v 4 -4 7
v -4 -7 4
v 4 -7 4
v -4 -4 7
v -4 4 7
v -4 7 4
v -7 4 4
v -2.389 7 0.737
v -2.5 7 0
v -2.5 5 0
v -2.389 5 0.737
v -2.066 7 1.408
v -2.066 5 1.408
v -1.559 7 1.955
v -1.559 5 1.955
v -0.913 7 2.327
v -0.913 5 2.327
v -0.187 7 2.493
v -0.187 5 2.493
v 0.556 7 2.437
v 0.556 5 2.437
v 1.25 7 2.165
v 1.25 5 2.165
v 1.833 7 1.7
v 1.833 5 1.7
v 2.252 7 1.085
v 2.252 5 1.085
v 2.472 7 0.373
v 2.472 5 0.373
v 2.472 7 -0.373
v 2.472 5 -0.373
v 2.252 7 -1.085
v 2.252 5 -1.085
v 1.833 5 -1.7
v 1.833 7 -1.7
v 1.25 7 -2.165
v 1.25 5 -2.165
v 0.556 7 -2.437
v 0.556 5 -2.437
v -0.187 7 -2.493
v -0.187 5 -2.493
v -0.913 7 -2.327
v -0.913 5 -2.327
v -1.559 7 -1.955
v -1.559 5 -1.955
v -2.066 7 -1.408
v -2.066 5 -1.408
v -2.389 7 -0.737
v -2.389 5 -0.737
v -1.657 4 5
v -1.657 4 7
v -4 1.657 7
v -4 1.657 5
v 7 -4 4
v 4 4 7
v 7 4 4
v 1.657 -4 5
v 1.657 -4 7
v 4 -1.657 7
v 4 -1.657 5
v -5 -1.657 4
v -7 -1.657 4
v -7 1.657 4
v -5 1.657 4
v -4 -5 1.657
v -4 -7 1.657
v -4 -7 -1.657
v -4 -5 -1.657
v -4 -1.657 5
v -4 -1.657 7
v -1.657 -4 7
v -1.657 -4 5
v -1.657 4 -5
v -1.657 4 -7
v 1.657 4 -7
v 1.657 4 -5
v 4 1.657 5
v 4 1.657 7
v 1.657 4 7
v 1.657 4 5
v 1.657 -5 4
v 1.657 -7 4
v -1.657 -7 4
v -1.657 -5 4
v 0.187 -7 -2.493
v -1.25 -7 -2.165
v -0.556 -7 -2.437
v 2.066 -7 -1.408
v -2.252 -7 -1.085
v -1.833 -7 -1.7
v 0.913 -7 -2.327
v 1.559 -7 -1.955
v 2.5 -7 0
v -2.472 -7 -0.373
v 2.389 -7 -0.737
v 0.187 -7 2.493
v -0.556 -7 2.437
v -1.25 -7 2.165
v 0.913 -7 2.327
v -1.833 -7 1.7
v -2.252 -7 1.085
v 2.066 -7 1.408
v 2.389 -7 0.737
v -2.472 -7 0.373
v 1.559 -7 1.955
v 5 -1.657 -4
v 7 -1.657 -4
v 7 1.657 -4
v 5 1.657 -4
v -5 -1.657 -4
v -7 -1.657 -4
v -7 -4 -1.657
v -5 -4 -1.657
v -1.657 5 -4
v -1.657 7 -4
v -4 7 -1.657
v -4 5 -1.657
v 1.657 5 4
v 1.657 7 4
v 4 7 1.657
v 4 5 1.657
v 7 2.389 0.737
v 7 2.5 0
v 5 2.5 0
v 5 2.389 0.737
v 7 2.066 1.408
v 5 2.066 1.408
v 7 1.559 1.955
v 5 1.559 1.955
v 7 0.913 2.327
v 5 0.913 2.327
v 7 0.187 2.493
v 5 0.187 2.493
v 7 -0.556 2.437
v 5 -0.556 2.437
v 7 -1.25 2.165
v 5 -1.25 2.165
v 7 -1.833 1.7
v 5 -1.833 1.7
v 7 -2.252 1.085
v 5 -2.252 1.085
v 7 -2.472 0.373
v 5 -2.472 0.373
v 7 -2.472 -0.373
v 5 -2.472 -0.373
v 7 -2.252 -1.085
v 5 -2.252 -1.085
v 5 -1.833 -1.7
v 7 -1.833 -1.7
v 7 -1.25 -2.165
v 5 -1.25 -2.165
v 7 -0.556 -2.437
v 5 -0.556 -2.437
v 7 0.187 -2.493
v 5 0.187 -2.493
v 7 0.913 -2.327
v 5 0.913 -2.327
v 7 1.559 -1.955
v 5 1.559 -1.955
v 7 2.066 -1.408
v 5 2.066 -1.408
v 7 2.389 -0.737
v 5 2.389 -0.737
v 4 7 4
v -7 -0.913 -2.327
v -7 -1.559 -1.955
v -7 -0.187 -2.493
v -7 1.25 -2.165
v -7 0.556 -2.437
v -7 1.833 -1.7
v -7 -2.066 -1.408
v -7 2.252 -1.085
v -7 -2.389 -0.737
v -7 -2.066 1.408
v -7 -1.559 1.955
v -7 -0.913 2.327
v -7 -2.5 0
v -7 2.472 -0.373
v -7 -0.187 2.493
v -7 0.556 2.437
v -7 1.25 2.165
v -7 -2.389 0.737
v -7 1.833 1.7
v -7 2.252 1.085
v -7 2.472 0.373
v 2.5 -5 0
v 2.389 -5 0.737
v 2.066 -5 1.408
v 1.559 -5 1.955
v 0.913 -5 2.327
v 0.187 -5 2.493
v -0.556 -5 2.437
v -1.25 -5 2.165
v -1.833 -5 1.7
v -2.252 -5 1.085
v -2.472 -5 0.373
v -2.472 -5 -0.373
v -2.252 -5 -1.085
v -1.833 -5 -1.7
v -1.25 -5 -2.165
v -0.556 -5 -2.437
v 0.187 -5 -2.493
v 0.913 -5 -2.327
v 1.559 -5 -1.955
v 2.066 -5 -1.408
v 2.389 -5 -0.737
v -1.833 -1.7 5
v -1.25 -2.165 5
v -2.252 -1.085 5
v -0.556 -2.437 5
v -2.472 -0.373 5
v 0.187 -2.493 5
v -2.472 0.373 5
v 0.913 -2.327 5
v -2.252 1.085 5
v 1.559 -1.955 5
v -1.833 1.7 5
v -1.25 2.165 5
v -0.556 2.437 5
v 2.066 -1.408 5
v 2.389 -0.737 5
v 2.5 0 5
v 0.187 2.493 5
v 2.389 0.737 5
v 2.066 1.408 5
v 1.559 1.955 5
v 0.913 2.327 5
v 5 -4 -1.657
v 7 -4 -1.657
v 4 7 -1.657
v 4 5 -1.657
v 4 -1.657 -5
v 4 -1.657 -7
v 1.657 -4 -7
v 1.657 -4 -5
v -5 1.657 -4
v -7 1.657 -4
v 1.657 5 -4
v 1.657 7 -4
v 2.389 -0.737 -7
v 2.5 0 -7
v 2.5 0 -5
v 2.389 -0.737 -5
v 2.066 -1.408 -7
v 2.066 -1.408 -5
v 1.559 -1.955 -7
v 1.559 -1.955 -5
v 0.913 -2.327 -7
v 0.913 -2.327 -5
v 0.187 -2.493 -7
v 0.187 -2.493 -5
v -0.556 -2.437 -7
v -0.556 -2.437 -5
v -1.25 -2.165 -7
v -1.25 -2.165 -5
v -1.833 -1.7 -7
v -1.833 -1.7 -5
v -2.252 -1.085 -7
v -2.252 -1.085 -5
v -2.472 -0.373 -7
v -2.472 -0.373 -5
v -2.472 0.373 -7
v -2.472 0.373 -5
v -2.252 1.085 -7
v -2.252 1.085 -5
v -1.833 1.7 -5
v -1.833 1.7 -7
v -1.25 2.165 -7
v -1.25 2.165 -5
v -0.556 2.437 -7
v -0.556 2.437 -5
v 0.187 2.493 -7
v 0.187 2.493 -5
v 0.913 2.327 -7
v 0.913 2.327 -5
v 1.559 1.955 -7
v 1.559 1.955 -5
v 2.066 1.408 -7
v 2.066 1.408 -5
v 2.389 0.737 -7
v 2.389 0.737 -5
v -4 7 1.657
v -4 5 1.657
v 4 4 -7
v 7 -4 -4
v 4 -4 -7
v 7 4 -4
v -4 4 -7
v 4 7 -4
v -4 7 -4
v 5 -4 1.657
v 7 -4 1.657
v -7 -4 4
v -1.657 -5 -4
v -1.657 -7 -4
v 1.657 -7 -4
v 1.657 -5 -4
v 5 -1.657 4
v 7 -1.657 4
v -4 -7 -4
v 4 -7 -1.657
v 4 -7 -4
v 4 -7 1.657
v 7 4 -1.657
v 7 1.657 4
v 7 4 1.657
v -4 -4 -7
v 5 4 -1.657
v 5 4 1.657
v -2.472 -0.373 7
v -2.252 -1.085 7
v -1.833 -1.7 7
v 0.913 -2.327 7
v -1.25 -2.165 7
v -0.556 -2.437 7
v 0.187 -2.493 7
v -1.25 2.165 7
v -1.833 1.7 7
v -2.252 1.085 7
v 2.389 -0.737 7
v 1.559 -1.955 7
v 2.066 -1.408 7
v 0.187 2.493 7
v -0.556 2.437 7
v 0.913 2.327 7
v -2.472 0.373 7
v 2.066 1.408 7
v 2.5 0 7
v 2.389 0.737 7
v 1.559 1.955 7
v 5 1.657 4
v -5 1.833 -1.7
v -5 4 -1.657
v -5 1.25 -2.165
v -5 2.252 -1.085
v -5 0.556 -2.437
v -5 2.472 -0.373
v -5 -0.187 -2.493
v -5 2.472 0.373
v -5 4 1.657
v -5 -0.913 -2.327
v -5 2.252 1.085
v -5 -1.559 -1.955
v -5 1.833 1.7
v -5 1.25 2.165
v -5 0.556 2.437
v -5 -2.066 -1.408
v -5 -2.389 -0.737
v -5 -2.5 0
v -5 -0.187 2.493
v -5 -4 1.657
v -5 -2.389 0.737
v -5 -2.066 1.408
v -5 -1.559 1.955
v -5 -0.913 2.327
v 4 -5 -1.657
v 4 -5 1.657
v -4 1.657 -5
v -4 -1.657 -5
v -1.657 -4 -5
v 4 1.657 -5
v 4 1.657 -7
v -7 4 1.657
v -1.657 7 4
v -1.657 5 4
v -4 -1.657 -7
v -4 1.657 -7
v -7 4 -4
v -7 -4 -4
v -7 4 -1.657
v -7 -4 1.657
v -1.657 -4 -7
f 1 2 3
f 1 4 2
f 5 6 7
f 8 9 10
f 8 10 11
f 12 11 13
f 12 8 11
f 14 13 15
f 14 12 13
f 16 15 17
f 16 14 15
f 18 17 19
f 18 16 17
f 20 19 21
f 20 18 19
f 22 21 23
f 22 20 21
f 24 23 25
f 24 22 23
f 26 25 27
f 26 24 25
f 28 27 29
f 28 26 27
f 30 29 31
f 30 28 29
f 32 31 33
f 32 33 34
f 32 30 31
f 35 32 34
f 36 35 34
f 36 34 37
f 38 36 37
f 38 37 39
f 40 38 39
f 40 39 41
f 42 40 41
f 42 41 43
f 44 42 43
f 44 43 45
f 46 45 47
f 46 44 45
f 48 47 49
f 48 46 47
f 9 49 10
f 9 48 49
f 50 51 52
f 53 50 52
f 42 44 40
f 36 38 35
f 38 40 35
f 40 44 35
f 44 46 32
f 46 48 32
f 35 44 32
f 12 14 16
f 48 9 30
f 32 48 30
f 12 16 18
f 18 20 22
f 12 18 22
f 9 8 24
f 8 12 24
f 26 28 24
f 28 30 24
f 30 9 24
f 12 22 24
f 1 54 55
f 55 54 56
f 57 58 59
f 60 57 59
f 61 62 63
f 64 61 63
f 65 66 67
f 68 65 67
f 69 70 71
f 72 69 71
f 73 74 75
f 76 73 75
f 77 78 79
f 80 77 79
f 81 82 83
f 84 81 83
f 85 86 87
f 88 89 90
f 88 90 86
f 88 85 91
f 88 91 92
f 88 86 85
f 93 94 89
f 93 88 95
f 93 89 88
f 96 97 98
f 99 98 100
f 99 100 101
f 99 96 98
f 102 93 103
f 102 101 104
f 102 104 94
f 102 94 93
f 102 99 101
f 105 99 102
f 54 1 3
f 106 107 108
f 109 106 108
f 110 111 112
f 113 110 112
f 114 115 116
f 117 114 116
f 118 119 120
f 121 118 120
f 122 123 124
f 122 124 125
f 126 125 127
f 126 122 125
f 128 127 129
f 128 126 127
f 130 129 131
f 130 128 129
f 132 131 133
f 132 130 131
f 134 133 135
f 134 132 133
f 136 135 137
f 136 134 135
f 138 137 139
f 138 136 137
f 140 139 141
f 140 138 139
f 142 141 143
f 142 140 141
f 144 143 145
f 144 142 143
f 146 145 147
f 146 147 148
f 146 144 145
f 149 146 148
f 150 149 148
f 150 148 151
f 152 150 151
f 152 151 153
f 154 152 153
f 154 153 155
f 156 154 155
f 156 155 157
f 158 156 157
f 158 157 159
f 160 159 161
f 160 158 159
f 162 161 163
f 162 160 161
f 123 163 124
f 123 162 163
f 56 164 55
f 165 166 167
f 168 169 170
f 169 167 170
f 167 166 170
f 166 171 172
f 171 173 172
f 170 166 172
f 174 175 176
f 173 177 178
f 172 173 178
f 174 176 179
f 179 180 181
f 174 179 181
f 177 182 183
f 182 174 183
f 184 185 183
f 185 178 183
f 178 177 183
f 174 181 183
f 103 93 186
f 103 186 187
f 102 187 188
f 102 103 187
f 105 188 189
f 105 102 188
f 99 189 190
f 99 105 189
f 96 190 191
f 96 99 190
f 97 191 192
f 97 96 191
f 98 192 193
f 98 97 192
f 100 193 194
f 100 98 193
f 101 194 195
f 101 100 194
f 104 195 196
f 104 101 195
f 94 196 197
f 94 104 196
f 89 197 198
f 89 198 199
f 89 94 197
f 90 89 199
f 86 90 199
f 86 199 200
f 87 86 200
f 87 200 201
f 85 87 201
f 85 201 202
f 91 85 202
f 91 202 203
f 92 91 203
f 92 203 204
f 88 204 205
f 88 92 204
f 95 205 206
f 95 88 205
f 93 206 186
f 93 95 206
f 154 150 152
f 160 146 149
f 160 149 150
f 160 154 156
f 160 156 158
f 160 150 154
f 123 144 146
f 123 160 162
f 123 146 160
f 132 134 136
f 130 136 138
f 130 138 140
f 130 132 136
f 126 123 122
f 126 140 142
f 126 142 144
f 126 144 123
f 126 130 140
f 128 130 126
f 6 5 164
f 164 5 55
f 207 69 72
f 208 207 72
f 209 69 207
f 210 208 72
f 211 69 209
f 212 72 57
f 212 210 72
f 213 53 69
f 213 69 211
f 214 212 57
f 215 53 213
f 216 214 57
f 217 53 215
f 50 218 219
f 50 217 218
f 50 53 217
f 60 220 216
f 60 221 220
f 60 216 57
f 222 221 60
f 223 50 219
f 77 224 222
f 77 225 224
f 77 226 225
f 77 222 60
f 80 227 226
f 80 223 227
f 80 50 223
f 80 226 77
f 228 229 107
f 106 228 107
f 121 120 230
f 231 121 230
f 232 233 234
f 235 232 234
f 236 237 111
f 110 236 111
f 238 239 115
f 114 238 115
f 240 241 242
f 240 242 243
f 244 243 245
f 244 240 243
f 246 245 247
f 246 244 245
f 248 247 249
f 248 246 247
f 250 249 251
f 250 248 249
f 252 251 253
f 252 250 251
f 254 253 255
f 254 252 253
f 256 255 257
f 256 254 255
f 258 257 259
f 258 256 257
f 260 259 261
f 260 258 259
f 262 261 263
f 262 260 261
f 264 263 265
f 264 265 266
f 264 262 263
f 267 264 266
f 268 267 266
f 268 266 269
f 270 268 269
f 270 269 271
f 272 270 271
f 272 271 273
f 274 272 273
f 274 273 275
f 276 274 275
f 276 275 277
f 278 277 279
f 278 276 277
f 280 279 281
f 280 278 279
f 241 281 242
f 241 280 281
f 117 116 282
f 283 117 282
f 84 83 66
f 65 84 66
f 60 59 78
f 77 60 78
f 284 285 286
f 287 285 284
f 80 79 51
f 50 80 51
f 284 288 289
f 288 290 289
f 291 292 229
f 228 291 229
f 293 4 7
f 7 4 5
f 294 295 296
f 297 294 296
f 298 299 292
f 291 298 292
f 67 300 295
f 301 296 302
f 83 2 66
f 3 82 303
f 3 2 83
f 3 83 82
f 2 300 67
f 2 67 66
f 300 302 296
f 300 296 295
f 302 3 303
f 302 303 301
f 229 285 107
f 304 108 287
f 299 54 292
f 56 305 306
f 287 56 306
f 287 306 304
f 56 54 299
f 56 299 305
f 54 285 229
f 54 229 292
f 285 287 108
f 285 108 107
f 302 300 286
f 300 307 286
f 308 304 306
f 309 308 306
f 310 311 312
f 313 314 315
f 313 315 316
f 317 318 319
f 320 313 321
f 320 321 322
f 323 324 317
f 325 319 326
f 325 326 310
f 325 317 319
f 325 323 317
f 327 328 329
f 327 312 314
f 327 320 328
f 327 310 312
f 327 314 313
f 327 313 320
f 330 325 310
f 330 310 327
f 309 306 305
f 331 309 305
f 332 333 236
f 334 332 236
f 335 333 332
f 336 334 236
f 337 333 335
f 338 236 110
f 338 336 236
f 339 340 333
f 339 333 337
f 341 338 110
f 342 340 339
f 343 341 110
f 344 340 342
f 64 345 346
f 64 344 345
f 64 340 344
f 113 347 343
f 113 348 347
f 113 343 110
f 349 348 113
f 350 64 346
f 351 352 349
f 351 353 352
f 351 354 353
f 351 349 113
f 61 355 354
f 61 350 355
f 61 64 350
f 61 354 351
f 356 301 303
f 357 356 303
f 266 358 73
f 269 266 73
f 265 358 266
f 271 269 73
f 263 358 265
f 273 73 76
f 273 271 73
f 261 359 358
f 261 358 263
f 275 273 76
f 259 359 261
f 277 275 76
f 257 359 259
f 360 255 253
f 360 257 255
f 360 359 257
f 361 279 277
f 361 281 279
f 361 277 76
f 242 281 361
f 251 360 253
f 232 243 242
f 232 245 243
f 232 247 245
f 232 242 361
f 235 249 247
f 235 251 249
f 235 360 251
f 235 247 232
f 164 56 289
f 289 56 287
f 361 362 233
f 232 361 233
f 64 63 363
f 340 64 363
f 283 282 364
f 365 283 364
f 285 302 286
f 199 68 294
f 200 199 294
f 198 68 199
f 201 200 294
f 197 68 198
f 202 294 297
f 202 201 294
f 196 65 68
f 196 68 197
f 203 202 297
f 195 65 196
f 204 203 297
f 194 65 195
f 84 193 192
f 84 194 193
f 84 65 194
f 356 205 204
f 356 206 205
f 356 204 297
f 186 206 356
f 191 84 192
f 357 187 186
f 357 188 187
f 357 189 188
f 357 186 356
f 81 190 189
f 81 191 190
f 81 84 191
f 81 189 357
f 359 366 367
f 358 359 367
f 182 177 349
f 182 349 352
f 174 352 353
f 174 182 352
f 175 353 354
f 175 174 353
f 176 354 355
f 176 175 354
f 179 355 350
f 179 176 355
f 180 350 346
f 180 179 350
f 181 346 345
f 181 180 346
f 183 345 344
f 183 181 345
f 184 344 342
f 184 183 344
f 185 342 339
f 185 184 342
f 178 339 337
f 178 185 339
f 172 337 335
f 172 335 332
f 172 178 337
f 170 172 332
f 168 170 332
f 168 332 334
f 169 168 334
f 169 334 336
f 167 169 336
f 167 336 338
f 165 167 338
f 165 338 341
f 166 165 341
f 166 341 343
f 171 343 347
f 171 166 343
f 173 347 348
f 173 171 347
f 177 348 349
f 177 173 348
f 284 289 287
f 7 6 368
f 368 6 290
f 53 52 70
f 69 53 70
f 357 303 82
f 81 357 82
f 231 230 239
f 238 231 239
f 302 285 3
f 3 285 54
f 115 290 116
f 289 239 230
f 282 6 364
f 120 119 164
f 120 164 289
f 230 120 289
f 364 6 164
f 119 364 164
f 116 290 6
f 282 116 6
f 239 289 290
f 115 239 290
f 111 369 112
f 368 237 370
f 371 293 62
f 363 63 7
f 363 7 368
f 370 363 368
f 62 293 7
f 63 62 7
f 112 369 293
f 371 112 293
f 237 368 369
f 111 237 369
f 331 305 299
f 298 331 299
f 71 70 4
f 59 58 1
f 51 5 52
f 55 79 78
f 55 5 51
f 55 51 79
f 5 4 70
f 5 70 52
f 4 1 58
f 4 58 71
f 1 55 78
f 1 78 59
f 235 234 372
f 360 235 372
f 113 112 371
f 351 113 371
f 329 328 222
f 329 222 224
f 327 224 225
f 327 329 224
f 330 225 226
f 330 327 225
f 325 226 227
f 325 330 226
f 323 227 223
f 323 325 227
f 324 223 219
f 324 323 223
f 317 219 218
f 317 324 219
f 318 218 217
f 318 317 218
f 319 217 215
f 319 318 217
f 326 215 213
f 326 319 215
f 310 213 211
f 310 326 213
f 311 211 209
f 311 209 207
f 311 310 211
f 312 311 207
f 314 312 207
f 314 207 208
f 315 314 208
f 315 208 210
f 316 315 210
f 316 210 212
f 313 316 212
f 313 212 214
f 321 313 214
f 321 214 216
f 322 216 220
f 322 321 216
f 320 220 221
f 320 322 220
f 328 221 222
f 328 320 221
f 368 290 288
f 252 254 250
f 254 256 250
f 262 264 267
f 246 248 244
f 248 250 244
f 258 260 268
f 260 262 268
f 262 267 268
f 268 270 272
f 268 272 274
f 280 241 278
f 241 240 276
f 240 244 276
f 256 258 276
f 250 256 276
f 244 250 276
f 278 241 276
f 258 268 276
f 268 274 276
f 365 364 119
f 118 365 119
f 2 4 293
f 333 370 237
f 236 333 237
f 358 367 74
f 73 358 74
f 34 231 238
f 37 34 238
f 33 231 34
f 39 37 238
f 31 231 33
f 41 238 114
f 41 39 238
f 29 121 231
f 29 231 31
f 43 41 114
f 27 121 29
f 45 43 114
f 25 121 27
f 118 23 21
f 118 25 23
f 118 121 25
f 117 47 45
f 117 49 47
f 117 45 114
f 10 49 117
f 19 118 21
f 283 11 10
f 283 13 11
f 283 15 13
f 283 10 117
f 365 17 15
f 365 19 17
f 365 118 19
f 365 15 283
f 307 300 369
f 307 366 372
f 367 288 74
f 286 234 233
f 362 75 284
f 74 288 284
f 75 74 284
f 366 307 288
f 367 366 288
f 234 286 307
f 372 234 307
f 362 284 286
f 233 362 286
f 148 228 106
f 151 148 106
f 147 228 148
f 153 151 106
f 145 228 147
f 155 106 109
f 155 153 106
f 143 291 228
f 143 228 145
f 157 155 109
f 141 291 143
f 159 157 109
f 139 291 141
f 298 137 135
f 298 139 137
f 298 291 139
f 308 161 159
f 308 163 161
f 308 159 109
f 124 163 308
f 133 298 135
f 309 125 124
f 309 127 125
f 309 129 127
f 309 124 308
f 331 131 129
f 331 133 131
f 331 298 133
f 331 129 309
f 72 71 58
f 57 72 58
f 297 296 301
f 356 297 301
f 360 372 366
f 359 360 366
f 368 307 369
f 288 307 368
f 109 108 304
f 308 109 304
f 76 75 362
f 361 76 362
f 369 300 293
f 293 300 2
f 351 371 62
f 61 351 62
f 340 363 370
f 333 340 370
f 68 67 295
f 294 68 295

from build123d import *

# Parameters (mm, degrees)
F0_W      = 14
F0_H      = 14
F1_DEPTH  = 7
F2_R      = 2.5
F4_DEPTH  = 2
F5_SIZE   = 2.99999
F6_R      = 2.5
F11_DEPTH = 2
F7_R      = 2.5
F12_DEPTH = 2
F8_R      = 2.5
F13_DEPTH = 2
F9_R      = 2.5
F14_DEPTH = 2
F10_R     = 2.5
F15_DEPTH = 2


# Not quite as in the source:
# - a fillet or chamfer is up to 0.001 mm smaller than in the source, because OpenCascade refuses the exact size


with BuildPart() as f1:
    # F0 (on Top) → F1 (new body, symmetric)
    with BuildSketch(Plane.XY):
        Rectangle(F0_W, F0_H)
    extrude(amount=F1_DEPTH, both=True)

    # F2 (on face) → F4 (cut)
    with BuildSketch(Plane.YZ.offset(7)):
        Polygon((-4, 1.6568542495), (-4, -1.6568542495), (-1.6568542495, -4), (1.6568542495, -4), (4, -1.6568542495), (4, 1.6568542495), (1.6568542495, 4), (-1.6568542495, 4), align=None)
        Circle(F2_R, mode=Mode.SUBTRACT)
    extrude(amount=-F4_DEPTH, mode=Mode.SUBTRACT)

    # F5 (size 3 in the source; OpenCascade refuses exactly that, so slightly less here)
    f5_edges = [f1.edges().sort_by_distance(p)[0] for p in [
        (7, 7, 0),
        (0, 7, -7),
        (-7, 7, 0),
        (0, 7, 7),
        (0, -7, 7),
        (7, 0, 7),
        (-7, 0, 7),
        (0, -7, -7),
        (7, -7, 0),
        (-7, -7, 0),
        (7, 0, -7),
        (-7, 0, -7),
    ]]
    chamfer(f5_edges, length=F5_SIZE)

    # F6 (on face) → F11 (cut)
    with BuildSketch(Plane(origin=(0, 7, 0), x_dir=(-1, 0, 0), z_dir=(0, 1, 0))):
        Polygon((-4, 1.6568542495), (-4, -1.6568542495), (-1.6568542495, -4), (1.6568542495, -4), (4, -1.6568542495), (4, 1.6568542495), (1.6568542495, 4), (-1.6568542495, 4), align=None)
        Circle(F6_R, mode=Mode.SUBTRACT)
    extrude(amount=-F11_DEPTH, mode=Mode.SUBTRACT)

    # F7 (on face) → F12 (cut)
    with BuildSketch(Plane.XY.offset(7)):
        Polygon((-4, 1.6568542495), (-4, -1.6568542495), (-1.6568542495, -4), (1.6568542495, -4), (4, -1.6568542495), (4, 1.6568542495), (1.6568542495, 4), (-1.6568542495, 4), align=None)
        Circle(F7_R, mode=Mode.SUBTRACT)
    extrude(amount=-F12_DEPTH, mode=Mode.SUBTRACT)

    # F8 (on face) → F13 (cut)
    with BuildSketch(Plane(origin=(-7, 0, 0), x_dir=(0, -1, 0), z_dir=(-1, 0, 0))):
        Polygon((-4, 1.6568542495), (-4, -1.6568542495), (-1.6568542495, -4), (1.6568542495, -4), (4, -1.6568542495), (4, 1.6568542495), (1.6568542495, 4), (-1.6568542495, 4), align=None)
        Circle(F8_R, mode=Mode.SUBTRACT)
    extrude(amount=-F13_DEPTH, mode=Mode.SUBTRACT)

    # F9 (on face) → F14 (cut)
    with BuildSketch(Plane.XZ.offset(7)):
        Polygon((-4, 1.6568542495), (-4, -1.6568542495), (-1.6568542495, -4), (1.6568542495, -4), (4, -1.6568542495), (4, 1.6568542495), (1.6568542495, 4), (-1.6568542495, 4), align=None)
        Circle(F9_R, mode=Mode.SUBTRACT)
    extrude(amount=-F14_DEPTH, mode=Mode.SUBTRACT)

    # F10 (on face) → F15 (cut)
    with BuildSketch(Plane(origin=(0, 0, -7), x_dir=(1, 0, 0), z_dir=(0, 0, -1))):
        Polygon((-4, 1.6568542495), (-4, -1.6568542495), (-1.6568542495, -4), (1.6568542495, -4), (4, -1.6568542495), (4, 1.6568542495), (1.6568542495, 4), (-1.6568542495, 4), align=None)
        Circle(F10_R, mode=Mode.SUBTRACT)
    extrude(amount=-F15_DEPTH, mode=Mode.SUBTRACT)


solid = f1.part
